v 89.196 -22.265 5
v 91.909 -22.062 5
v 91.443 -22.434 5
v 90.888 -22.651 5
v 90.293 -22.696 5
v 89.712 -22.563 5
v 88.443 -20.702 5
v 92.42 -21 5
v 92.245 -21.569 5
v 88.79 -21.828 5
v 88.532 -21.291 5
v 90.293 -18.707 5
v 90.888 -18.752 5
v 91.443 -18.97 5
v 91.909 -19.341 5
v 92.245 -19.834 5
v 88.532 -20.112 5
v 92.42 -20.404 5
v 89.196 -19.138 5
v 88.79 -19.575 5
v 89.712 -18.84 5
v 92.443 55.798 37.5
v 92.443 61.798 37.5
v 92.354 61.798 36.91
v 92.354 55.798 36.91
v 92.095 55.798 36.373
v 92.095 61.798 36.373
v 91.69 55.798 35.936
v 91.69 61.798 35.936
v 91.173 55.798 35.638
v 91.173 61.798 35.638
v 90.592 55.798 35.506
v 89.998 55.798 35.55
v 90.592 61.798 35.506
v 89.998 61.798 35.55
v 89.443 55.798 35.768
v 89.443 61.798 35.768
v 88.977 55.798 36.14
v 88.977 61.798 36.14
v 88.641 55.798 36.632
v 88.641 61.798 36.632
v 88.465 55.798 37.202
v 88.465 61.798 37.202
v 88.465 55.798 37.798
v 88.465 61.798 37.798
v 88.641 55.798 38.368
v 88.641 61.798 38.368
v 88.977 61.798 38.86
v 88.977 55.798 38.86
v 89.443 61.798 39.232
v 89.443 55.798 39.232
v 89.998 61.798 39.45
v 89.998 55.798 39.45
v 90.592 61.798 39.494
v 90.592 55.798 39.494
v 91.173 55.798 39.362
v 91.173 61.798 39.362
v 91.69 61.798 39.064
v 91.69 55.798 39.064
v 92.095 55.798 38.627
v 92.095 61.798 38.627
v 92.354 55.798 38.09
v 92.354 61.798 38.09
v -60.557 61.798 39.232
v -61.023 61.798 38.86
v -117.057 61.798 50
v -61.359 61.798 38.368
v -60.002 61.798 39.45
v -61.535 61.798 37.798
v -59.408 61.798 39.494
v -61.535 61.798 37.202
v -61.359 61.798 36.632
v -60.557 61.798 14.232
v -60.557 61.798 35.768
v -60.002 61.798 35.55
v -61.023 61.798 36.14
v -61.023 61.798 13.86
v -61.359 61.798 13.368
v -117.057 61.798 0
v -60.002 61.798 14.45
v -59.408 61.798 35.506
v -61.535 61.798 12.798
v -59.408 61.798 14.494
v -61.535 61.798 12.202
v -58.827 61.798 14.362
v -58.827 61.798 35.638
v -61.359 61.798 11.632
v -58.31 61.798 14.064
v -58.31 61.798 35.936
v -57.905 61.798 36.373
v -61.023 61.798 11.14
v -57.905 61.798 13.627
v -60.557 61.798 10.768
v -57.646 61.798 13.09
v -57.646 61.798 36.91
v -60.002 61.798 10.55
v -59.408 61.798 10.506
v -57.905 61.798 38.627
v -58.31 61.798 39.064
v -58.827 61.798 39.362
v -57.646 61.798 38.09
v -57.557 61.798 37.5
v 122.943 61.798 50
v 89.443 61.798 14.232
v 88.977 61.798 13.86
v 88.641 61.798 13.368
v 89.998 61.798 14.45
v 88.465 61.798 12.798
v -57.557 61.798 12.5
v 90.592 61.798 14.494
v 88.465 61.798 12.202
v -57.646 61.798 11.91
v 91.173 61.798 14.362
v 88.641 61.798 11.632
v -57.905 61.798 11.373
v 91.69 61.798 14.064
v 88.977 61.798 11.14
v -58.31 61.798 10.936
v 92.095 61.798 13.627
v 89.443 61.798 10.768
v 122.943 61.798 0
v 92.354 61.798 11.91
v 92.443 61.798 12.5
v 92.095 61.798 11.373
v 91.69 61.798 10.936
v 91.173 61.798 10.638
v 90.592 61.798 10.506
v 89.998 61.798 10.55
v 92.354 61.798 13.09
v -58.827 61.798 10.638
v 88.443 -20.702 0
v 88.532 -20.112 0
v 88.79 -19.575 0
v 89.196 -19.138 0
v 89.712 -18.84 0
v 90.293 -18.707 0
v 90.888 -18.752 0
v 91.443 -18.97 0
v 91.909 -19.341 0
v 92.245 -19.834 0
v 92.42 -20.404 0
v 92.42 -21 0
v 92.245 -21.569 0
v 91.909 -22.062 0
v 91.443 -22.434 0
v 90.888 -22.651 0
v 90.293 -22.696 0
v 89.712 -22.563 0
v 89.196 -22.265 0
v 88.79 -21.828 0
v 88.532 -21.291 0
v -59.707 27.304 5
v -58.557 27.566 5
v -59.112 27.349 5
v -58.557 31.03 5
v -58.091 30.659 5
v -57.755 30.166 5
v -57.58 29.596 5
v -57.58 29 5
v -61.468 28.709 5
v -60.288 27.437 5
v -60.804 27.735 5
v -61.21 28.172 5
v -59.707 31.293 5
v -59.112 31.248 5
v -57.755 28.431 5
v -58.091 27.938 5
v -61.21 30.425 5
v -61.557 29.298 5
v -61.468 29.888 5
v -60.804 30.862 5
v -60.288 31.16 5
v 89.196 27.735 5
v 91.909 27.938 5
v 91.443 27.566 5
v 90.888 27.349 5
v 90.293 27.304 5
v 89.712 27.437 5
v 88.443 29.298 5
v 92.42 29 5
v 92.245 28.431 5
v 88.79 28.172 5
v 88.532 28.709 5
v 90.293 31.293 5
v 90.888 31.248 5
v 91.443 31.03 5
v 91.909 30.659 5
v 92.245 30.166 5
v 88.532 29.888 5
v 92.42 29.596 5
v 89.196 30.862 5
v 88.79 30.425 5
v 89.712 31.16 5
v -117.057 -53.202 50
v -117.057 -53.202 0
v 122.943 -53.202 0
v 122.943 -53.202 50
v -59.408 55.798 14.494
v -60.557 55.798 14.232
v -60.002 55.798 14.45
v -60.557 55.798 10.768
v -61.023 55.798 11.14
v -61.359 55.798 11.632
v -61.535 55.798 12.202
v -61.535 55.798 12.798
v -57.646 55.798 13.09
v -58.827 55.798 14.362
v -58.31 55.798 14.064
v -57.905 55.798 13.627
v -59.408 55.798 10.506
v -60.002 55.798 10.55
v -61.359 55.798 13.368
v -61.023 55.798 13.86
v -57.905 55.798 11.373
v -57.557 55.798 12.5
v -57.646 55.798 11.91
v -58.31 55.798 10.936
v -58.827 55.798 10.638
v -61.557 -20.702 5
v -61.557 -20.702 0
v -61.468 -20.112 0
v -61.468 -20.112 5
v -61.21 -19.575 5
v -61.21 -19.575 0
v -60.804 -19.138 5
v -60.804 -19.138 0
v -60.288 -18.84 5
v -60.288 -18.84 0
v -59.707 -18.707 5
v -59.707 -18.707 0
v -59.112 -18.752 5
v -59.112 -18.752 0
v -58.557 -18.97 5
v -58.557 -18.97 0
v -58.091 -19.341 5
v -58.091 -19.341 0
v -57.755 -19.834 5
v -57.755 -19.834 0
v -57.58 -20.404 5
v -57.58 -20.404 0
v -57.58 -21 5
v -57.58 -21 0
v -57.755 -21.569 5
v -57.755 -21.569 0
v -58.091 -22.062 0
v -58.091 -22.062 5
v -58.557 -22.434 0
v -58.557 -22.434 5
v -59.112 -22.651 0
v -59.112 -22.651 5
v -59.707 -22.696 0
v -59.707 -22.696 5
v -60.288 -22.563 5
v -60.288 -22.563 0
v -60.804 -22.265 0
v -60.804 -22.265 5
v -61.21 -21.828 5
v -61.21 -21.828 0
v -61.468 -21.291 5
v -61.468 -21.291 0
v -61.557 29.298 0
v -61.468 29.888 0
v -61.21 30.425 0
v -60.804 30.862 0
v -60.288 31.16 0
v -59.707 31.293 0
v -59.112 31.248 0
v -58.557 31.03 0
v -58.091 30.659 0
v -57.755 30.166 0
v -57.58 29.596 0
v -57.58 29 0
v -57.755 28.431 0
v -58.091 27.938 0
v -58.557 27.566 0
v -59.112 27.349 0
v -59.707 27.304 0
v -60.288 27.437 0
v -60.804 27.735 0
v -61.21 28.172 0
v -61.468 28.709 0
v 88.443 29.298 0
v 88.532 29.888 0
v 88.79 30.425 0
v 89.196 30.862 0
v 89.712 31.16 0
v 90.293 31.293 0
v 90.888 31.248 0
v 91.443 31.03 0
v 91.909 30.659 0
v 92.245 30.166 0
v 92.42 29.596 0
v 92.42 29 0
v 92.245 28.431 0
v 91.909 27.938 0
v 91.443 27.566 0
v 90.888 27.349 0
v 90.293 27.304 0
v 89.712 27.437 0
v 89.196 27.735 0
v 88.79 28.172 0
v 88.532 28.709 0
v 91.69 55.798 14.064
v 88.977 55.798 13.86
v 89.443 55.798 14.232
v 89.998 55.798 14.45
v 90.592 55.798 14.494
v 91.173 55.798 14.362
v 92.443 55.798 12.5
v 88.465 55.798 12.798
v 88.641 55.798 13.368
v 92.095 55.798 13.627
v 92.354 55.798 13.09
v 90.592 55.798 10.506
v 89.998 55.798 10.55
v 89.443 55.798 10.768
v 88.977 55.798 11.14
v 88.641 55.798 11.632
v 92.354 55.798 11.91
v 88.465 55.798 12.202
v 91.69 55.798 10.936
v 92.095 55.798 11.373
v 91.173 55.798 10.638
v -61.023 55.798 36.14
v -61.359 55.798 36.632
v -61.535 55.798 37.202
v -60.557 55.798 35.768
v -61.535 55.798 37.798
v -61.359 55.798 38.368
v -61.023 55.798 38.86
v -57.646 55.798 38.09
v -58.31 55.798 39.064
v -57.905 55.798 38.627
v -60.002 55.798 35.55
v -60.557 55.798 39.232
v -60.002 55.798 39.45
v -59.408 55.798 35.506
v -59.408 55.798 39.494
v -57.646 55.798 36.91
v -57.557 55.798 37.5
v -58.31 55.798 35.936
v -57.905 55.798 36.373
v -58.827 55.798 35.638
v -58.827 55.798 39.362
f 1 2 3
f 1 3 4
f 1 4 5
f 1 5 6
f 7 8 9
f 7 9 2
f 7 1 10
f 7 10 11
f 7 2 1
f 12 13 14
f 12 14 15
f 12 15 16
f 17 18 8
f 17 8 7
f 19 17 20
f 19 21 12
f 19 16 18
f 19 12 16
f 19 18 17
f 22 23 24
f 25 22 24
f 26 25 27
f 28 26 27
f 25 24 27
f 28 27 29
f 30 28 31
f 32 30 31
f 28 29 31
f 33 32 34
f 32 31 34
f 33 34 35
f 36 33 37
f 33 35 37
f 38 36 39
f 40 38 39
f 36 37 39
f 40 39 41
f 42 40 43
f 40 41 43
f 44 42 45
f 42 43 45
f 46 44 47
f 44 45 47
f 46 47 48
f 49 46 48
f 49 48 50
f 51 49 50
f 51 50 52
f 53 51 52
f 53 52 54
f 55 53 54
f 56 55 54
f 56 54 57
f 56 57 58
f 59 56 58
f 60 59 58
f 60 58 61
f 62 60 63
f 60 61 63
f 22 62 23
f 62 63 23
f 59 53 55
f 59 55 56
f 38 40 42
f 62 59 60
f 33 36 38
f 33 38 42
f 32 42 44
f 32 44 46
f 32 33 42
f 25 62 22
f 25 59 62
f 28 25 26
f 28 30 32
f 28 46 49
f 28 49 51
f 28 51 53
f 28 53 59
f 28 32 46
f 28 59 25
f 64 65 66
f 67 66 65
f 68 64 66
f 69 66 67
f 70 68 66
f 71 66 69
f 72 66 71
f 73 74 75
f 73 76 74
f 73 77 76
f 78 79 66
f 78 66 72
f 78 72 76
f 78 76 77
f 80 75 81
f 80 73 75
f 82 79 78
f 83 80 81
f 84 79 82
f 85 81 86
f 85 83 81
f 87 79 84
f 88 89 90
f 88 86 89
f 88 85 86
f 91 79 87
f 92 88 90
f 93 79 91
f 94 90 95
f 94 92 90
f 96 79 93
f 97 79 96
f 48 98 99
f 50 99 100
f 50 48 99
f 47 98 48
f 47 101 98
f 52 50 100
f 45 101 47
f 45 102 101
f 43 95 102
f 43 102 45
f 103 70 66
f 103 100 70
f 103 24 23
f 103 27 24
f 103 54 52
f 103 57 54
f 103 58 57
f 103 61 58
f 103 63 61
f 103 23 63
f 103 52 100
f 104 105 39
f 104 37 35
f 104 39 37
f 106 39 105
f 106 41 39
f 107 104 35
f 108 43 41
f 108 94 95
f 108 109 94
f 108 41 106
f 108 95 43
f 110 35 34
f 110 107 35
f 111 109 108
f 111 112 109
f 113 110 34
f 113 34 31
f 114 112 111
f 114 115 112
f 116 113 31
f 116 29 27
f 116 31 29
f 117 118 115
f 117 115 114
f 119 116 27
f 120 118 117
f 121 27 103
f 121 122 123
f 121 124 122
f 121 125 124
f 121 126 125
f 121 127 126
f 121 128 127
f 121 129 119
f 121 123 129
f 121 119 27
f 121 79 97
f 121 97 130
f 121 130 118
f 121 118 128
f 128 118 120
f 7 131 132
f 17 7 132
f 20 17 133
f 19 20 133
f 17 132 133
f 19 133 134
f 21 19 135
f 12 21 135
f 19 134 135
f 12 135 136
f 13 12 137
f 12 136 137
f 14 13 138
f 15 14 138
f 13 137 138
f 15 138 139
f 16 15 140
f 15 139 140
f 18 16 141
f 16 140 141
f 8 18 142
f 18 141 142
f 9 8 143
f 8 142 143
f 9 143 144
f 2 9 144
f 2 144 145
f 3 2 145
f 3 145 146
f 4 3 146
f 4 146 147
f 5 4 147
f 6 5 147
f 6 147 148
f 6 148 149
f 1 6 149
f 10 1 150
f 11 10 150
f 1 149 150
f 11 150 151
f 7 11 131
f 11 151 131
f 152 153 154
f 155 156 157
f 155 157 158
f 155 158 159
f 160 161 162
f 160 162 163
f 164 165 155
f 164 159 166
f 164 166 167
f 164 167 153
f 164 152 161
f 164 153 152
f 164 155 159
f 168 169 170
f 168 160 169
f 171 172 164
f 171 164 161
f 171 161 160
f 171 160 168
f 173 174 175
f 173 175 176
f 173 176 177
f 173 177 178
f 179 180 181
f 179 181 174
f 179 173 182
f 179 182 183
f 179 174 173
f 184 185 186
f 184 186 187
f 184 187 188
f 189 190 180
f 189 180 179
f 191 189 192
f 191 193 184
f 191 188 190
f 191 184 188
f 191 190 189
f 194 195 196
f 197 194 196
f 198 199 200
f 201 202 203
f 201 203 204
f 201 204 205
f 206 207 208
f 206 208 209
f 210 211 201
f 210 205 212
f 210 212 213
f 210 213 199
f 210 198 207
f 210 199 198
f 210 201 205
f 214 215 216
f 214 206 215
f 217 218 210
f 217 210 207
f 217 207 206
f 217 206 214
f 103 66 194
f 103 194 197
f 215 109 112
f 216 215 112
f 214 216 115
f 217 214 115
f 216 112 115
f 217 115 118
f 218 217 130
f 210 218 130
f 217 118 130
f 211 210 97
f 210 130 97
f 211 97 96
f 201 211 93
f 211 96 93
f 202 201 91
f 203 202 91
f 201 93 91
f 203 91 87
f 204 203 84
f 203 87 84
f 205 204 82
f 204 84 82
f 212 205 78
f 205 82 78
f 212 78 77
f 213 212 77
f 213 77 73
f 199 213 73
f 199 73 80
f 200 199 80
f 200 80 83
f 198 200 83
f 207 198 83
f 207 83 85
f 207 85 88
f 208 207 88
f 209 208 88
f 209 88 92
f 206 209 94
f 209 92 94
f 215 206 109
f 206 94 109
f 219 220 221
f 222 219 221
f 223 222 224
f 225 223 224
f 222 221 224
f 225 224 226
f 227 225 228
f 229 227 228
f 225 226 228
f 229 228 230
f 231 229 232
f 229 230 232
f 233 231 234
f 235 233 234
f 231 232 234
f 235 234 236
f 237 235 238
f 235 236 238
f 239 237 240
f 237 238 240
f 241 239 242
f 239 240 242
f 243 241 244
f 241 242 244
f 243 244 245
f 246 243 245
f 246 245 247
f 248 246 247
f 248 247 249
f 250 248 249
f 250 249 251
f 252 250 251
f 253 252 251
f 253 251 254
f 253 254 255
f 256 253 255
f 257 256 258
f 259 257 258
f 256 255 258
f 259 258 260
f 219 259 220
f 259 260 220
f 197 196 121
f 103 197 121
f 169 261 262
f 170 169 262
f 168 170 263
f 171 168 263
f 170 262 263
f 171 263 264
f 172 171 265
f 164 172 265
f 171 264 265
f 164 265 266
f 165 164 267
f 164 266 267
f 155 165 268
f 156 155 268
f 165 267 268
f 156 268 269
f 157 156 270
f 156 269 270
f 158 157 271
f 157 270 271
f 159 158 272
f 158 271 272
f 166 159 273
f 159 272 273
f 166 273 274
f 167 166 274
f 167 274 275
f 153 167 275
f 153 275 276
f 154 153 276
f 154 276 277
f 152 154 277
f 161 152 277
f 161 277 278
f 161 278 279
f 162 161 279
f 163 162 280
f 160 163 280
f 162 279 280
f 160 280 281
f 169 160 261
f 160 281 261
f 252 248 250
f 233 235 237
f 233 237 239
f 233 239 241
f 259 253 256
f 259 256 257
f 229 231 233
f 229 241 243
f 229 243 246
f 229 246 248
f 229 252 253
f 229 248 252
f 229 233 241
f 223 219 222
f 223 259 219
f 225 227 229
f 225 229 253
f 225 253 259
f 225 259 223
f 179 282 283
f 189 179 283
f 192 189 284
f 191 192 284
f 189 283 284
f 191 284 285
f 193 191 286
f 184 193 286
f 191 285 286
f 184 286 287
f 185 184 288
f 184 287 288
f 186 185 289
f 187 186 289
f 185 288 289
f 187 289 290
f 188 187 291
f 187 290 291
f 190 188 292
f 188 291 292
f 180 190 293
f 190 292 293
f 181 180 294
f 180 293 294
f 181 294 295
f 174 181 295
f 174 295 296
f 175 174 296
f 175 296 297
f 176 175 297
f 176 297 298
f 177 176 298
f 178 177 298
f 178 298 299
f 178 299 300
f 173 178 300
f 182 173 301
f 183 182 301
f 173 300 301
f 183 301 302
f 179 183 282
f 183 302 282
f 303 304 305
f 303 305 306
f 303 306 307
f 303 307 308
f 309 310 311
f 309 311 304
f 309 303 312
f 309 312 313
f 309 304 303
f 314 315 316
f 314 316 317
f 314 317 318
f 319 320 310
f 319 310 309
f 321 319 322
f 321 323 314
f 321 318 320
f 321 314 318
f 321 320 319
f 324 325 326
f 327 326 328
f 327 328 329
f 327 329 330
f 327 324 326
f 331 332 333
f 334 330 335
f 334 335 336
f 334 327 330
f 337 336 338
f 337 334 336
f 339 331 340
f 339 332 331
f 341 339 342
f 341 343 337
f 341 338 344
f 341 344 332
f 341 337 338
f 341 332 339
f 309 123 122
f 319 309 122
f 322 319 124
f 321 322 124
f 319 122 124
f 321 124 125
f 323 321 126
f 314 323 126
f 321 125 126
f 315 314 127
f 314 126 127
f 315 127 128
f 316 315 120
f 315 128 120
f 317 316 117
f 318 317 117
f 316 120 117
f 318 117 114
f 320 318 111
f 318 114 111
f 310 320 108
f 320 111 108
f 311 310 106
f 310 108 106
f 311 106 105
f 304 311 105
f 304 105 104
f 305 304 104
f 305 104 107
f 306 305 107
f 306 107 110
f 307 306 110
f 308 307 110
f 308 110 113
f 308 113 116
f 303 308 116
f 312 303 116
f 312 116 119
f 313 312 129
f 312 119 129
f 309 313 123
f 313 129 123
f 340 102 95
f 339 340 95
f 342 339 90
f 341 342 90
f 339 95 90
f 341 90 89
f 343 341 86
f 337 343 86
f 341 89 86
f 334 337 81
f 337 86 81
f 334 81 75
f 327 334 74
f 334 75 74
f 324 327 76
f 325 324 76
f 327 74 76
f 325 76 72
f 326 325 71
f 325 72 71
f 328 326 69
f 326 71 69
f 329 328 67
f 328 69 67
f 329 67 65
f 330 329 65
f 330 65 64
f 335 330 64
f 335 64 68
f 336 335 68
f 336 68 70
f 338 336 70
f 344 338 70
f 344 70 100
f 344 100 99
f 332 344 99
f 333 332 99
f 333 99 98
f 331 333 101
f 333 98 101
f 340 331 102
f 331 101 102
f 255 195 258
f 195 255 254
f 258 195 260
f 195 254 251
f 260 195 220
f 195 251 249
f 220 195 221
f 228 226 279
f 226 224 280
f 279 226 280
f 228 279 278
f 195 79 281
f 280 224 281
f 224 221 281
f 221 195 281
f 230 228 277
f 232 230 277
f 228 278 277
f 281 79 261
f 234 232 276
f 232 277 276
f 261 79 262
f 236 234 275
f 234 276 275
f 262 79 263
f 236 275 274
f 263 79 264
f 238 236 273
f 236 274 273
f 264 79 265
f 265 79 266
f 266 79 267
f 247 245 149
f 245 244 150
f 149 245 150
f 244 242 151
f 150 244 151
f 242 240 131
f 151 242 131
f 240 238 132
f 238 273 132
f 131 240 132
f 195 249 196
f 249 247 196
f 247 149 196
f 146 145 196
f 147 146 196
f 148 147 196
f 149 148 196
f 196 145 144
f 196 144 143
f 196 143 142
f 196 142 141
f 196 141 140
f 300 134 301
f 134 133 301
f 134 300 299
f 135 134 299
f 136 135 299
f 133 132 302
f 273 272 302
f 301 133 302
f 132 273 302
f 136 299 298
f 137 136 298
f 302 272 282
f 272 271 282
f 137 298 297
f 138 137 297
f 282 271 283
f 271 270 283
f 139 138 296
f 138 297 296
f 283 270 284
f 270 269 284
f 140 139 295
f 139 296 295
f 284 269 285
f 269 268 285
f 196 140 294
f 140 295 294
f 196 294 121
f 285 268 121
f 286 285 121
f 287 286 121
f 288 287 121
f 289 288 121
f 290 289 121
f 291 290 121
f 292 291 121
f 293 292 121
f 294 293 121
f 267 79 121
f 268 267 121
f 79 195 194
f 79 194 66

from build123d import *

# Parameters (mm, degrees)
SKETCH_1_W          = 240
SKETCH_1_H          = 115
EXTRUDE_1_DEPTH     = 50
SKETCH_2_R          = 2
CUT_EXTRUDE_1_DEPTH = 5
SKETCH_3_R          = 2
CUT_EXTRUDE_2_DEPTH = 6


with BuildPart() as part:
    # 草图1 → 凸台-拉伸1 (new body)
    with BuildSketch(Plane.XY):
        with Locations((2.942779292, 4.298365123)):
            Rectangle(SKETCH_1_W, SKETCH_1_H)
    extrude(amount=EXTRUDE_1_DEPTH)

    # 草图2 → 切除-拉伸1 (cut)
    with BuildSketch(Plane(origin=(0, 0, 0), x_dir=(-1, 0, 0), z_dir=(0, 0, -1))):
        with Locations((-90.442779292, 29.298365123)):
            Circle(SKETCH_2_R)
        with Locations((59.557220708, 29.298365123)):
            Circle(SKETCH_2_R)
        with Locations((59.557220708, -20.701634877)):
            Circle(SKETCH_2_R)
        with Locations((-90.442779292, -20.701634877)):
            Circle(SKETCH_2_R)
    extrude(amount=-CUT_EXTRUDE_1_DEPTH, mode=Mode.SUBTRACT)

    # 草图3 → 切除-拉伸2 (cut)
    with BuildSketch(Plane(origin=(0, 61.798365123, 0), x_dir=(1, 0, 0), z_dir=(0, 1, 0))):
        with Locations((90.442779292, -37.5)):
            Circle(SKETCH_3_R)
        with Locations((-59.557220708, -37.5)):
            Circle(SKETCH_3_R)
        with Locations((-59.557220708, -12.5)):
            Circle(SKETCH_3_R)
        with Locations((90.442779292, -12.5)):
            Circle(SKETCH_3_R)
    extrude(amount=-CUT_EXTRUDE_2_DEPTH, mode=Mode.SUBTRACT)


solid = part.part
